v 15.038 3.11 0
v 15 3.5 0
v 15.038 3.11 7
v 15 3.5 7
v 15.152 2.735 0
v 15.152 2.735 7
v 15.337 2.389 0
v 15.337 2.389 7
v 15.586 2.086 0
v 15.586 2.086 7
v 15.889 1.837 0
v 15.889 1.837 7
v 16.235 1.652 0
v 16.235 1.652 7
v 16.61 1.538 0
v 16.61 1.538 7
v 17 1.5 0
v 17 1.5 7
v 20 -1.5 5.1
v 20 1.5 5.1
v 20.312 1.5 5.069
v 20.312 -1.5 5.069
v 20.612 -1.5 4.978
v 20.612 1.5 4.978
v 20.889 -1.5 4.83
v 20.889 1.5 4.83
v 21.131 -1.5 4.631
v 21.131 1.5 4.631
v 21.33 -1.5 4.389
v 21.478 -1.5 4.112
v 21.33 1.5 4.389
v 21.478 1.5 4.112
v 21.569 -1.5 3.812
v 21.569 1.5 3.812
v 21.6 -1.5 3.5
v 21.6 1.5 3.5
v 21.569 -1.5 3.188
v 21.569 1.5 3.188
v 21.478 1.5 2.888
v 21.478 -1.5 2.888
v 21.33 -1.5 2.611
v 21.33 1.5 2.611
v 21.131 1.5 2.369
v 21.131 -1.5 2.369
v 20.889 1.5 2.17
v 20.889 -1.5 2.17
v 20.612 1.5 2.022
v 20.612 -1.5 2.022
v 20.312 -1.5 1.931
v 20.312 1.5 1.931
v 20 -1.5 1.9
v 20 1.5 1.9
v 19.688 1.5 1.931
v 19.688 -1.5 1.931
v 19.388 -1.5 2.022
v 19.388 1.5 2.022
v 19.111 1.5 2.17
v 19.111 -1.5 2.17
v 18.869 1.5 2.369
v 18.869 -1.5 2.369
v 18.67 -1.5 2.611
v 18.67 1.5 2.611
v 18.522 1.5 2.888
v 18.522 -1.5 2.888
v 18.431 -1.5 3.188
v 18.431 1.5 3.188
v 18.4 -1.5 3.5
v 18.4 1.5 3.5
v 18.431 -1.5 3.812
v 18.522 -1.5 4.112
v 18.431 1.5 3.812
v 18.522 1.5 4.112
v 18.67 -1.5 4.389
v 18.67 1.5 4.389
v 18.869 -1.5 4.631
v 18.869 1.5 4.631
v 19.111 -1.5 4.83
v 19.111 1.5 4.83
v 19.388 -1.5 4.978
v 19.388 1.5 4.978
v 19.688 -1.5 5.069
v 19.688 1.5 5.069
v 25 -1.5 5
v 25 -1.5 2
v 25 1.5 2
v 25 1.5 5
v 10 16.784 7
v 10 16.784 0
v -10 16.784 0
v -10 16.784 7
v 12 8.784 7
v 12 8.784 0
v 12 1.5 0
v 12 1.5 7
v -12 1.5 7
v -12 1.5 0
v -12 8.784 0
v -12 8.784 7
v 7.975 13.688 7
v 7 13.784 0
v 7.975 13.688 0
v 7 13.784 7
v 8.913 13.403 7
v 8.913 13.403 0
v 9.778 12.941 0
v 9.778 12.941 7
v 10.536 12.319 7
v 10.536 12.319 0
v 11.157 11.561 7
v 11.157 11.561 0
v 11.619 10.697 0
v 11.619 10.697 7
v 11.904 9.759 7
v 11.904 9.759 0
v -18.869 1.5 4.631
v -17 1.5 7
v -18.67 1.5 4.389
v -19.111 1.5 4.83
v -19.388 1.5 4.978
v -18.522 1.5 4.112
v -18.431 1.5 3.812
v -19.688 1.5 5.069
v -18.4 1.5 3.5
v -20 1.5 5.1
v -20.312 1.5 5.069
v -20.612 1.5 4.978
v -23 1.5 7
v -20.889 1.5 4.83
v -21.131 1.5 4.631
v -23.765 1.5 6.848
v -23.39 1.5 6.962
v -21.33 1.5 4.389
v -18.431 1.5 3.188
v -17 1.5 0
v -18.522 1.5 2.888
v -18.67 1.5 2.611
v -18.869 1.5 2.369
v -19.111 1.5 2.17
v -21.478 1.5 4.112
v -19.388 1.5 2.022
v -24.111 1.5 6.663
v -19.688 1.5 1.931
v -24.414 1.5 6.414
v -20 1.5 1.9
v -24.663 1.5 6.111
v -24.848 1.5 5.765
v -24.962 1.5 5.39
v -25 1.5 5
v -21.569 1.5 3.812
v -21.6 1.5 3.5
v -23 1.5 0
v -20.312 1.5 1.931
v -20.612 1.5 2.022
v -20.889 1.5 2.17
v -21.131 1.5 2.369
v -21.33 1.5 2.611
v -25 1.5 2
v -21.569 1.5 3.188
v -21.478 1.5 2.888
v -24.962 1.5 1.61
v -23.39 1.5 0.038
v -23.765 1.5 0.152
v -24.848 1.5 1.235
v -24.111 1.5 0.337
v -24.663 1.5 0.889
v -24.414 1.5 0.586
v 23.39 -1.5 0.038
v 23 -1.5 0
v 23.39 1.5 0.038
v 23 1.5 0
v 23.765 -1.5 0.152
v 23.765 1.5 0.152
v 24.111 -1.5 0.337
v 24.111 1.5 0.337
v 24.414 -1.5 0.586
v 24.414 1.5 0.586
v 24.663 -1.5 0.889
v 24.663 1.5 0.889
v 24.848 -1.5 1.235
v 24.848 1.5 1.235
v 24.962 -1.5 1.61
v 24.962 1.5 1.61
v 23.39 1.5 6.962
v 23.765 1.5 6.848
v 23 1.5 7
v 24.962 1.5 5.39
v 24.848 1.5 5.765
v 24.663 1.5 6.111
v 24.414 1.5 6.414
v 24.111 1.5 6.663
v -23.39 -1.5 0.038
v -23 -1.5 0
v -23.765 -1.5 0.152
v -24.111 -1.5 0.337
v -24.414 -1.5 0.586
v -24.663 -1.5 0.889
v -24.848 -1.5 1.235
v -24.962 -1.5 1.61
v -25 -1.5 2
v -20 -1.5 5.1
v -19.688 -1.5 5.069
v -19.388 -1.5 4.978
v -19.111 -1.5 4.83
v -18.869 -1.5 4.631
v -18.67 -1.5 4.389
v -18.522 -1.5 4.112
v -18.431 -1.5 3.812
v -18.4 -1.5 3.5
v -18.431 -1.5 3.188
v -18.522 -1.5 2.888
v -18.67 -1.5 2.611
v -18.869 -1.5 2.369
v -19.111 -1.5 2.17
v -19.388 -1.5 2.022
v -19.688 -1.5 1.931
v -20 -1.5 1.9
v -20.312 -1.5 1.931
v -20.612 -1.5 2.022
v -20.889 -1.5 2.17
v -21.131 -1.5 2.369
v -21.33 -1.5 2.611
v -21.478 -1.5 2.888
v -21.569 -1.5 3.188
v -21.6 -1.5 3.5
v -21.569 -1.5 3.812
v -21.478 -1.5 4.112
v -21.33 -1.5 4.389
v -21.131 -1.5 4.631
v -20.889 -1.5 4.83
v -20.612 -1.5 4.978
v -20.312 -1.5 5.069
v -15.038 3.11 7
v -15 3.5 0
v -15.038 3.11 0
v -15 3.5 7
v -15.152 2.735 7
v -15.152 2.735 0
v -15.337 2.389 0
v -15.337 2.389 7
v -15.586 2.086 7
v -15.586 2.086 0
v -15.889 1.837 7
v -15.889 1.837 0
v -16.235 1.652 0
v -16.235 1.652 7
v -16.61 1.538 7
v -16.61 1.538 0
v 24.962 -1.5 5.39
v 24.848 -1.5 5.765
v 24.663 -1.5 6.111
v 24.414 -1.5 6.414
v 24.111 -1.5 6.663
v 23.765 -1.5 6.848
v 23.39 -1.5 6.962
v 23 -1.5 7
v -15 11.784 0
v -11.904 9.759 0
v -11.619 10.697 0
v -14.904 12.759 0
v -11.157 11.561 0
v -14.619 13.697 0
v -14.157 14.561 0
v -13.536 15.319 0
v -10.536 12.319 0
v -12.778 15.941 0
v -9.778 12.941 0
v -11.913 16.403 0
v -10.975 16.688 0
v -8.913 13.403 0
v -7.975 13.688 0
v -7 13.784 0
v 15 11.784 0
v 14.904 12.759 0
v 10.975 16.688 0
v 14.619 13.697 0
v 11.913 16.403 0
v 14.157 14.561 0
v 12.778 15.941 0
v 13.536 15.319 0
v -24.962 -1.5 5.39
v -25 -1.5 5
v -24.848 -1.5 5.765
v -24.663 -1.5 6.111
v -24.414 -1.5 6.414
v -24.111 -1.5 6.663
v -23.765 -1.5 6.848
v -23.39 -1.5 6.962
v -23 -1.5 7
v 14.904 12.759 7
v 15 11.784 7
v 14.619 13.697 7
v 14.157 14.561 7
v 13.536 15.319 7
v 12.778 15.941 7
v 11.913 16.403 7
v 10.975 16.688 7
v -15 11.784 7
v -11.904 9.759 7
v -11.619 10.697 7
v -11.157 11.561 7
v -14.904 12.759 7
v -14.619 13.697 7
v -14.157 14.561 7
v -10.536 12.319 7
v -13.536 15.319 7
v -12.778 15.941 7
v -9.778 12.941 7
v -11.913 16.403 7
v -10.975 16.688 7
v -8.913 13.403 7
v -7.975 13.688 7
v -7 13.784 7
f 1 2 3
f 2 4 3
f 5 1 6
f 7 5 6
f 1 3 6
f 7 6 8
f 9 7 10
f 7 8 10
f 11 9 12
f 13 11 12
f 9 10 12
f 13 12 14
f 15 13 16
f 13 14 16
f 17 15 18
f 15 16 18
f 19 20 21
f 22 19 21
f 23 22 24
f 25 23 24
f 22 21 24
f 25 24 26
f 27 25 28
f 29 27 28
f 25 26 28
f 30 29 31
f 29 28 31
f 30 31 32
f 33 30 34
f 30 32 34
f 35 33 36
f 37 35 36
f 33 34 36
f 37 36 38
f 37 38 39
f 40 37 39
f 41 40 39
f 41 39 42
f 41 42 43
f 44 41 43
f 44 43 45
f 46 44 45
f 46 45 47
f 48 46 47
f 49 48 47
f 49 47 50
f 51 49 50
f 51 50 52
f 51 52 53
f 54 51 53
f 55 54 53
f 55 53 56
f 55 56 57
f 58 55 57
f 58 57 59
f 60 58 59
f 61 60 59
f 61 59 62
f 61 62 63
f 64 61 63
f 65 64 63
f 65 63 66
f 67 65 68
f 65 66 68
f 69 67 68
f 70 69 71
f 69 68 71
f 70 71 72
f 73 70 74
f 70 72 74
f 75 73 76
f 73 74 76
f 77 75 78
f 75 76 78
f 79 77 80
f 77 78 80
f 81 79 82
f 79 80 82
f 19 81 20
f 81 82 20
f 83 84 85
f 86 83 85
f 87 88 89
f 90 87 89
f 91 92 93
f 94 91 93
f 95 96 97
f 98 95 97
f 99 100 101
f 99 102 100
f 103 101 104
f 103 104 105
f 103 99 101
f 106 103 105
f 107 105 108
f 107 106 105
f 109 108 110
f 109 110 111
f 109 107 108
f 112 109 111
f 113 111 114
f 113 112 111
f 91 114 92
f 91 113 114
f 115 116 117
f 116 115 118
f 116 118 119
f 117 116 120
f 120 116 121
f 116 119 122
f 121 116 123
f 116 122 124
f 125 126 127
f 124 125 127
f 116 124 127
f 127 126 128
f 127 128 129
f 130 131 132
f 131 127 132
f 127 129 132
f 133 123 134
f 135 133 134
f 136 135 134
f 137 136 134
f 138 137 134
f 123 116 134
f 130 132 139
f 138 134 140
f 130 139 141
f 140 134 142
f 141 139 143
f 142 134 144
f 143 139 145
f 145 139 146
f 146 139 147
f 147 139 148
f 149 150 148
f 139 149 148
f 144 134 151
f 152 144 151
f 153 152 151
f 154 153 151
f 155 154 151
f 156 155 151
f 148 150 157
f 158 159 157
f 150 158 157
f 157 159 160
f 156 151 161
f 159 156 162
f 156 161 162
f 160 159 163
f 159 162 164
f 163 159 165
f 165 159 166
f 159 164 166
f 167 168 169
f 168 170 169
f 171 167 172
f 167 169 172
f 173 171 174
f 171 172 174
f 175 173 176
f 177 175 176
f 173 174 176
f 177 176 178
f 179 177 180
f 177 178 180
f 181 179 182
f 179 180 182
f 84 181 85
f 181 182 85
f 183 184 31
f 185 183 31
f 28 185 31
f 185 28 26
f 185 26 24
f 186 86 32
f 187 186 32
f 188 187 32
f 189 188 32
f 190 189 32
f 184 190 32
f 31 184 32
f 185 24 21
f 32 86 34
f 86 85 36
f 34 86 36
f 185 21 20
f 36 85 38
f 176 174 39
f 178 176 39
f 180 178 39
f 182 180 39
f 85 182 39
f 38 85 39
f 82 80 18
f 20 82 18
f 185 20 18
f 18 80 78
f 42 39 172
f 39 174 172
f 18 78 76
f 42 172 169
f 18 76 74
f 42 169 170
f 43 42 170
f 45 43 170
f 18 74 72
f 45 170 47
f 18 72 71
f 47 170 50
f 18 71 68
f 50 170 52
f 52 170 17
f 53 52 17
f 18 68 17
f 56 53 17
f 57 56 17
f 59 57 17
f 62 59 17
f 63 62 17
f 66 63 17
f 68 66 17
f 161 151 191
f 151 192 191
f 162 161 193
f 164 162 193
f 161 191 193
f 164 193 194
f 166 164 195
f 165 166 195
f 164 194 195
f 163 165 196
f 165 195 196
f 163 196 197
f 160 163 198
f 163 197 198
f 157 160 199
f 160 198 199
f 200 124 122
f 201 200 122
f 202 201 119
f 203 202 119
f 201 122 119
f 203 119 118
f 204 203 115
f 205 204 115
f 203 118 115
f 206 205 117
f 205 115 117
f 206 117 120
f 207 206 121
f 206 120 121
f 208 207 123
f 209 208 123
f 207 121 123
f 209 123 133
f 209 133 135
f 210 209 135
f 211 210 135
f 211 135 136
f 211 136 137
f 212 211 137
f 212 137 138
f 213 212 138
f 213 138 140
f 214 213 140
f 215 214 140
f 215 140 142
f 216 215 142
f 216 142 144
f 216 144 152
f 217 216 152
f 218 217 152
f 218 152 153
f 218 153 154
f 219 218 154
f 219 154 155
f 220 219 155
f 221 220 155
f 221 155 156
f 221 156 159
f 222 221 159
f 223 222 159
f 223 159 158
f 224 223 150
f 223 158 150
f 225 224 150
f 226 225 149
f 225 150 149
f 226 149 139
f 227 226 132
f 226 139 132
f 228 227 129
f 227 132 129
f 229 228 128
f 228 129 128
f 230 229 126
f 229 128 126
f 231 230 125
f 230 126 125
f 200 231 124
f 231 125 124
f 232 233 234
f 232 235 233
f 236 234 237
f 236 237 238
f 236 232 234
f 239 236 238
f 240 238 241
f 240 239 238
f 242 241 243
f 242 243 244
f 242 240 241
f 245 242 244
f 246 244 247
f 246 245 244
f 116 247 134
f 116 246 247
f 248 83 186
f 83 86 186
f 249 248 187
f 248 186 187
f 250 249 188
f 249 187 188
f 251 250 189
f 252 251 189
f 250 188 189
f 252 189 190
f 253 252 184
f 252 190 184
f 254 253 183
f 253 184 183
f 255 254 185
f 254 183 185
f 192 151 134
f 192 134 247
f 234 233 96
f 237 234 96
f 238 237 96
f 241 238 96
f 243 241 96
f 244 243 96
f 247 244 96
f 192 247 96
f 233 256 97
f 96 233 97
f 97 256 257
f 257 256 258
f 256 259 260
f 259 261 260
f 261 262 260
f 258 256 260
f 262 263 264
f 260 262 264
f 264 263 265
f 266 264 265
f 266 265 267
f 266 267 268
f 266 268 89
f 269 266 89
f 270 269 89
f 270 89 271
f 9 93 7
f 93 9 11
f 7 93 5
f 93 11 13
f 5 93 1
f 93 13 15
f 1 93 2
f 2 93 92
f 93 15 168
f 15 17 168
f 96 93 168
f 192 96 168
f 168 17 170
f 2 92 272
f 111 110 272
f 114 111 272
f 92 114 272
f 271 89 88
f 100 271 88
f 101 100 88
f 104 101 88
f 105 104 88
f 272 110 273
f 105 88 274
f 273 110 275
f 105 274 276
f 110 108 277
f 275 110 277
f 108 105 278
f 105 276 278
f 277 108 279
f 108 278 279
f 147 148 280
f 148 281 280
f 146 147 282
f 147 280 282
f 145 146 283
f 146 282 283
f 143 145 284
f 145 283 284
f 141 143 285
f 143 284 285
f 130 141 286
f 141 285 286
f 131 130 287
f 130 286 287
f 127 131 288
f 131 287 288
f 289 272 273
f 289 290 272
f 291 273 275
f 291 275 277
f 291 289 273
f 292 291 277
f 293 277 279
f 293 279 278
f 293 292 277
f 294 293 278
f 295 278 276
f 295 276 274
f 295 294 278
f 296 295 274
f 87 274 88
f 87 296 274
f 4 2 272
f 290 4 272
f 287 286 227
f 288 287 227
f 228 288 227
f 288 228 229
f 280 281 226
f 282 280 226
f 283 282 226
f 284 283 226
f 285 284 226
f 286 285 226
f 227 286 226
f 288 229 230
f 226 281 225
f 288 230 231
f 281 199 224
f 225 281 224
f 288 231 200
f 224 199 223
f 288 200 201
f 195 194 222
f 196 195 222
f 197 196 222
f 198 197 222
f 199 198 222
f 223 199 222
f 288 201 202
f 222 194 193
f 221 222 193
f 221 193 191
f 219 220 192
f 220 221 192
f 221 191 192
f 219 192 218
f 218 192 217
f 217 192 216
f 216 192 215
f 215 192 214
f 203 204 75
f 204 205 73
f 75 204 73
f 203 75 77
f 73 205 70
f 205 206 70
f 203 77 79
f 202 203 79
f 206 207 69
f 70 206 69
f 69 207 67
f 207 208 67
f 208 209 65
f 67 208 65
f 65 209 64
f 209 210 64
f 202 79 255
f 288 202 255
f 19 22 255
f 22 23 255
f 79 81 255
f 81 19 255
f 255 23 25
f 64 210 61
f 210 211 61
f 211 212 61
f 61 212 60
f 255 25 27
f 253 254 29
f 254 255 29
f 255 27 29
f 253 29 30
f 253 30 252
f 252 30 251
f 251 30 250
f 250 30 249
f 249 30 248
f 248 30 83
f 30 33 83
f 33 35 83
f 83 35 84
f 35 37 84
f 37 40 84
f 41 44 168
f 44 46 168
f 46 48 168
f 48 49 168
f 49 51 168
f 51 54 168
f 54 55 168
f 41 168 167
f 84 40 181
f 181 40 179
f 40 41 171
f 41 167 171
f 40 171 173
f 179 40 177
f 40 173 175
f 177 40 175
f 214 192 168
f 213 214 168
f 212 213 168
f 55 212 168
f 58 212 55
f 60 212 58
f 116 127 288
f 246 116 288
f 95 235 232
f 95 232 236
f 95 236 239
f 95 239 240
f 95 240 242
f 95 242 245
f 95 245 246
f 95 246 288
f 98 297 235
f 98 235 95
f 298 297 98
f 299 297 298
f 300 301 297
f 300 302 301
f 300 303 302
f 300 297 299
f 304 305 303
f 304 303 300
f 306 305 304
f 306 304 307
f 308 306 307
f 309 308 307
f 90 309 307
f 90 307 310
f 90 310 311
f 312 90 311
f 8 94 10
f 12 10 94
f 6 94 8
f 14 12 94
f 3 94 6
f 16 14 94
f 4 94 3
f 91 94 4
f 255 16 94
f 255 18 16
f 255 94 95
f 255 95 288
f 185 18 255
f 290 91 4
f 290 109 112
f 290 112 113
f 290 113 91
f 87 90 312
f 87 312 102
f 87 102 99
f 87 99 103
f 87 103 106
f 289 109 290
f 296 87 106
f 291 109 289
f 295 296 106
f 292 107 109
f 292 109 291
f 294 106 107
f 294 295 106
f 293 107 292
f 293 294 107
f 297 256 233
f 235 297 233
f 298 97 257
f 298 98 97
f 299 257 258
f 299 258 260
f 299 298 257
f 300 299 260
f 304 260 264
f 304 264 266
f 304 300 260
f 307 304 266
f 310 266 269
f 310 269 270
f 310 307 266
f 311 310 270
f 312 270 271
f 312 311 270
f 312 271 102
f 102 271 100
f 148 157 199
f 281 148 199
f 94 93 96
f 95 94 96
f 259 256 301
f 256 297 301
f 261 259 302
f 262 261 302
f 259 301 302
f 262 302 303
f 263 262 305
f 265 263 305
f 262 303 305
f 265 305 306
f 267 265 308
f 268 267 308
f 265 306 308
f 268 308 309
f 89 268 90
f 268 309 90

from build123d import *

# Parameters (mm, degrees)
BOSS_EXTRUDE1_DEPTH = 7
SKETCH3_R           = 1.6
CUT_EXTRUDE1_DEPTH  = 7
FILLET1_R           = 5
FILLET2_R           = 2


with BuildPart() as part:
    # Sketch2 → Boss-Extrude1 (new body)
    with BuildSketch(Plane.XY):
        Polygon((-25, 1.5), (-25, -1.5), (25, -1.5), (25, 1.5), (15, 1.5), (12, 1.5), (-12, 1.5), (-15, 1.5), align=None)
        Polygon((-15, 16.783591394), (-15, 1.5), (-12, 1.5), (-12, 13.783591394), (12, 13.783591394), (12, 1.5), (15, 1.5), (15, 16.783591394), align=None)
    extrude(amount=BOSS_EXTRUDE1_DEPTH)

    # Sketch3 → Cut-Extrude1 (cut)
    with BuildSketch(Plane(origin=(0, 1.5, 0), x_dir=(1, 0, 0), z_dir=(0, 1, 0))):
        with Locations(Location((-20, -3.5, 0), (0, 0, 270))):
            Circle(SKETCH3_R)
        with Locations(Location((20, -3.5, 0), (0, 0, 270))):
            Circle(SKETCH3_R)
    extrude(amount=-CUT_EXTRUDE1_DEPTH, mode=Mode.SUBTRACT)

    # Fillet1
    fillet1_edges = [part.edges().sort_by_distance(p)[0] for p in [
        (-15, 16.783591394, 3.5),
        (15, 16.783591394, 3.5),
        (12, 13.783591394, 3.5),
        (-12, 13.783591394, 3.5),
    ]]
    fillet(fillet1_edges, radius=FILLET1_R)

    # Fillet2
    fillet2_edges = [part.edges().sort_by_distance(p)[0] for p in [
        (-25, 0, 0),
        (25, 0, 0),
        (-15, 1.5, 3.5),
        (15, 1.5, 3.5),
        (25, 0, 7),
        (-25, 0, 7),
    ]]
    fillet(fillet2_edges, radius=FILLET2_R)


solid = part.part
